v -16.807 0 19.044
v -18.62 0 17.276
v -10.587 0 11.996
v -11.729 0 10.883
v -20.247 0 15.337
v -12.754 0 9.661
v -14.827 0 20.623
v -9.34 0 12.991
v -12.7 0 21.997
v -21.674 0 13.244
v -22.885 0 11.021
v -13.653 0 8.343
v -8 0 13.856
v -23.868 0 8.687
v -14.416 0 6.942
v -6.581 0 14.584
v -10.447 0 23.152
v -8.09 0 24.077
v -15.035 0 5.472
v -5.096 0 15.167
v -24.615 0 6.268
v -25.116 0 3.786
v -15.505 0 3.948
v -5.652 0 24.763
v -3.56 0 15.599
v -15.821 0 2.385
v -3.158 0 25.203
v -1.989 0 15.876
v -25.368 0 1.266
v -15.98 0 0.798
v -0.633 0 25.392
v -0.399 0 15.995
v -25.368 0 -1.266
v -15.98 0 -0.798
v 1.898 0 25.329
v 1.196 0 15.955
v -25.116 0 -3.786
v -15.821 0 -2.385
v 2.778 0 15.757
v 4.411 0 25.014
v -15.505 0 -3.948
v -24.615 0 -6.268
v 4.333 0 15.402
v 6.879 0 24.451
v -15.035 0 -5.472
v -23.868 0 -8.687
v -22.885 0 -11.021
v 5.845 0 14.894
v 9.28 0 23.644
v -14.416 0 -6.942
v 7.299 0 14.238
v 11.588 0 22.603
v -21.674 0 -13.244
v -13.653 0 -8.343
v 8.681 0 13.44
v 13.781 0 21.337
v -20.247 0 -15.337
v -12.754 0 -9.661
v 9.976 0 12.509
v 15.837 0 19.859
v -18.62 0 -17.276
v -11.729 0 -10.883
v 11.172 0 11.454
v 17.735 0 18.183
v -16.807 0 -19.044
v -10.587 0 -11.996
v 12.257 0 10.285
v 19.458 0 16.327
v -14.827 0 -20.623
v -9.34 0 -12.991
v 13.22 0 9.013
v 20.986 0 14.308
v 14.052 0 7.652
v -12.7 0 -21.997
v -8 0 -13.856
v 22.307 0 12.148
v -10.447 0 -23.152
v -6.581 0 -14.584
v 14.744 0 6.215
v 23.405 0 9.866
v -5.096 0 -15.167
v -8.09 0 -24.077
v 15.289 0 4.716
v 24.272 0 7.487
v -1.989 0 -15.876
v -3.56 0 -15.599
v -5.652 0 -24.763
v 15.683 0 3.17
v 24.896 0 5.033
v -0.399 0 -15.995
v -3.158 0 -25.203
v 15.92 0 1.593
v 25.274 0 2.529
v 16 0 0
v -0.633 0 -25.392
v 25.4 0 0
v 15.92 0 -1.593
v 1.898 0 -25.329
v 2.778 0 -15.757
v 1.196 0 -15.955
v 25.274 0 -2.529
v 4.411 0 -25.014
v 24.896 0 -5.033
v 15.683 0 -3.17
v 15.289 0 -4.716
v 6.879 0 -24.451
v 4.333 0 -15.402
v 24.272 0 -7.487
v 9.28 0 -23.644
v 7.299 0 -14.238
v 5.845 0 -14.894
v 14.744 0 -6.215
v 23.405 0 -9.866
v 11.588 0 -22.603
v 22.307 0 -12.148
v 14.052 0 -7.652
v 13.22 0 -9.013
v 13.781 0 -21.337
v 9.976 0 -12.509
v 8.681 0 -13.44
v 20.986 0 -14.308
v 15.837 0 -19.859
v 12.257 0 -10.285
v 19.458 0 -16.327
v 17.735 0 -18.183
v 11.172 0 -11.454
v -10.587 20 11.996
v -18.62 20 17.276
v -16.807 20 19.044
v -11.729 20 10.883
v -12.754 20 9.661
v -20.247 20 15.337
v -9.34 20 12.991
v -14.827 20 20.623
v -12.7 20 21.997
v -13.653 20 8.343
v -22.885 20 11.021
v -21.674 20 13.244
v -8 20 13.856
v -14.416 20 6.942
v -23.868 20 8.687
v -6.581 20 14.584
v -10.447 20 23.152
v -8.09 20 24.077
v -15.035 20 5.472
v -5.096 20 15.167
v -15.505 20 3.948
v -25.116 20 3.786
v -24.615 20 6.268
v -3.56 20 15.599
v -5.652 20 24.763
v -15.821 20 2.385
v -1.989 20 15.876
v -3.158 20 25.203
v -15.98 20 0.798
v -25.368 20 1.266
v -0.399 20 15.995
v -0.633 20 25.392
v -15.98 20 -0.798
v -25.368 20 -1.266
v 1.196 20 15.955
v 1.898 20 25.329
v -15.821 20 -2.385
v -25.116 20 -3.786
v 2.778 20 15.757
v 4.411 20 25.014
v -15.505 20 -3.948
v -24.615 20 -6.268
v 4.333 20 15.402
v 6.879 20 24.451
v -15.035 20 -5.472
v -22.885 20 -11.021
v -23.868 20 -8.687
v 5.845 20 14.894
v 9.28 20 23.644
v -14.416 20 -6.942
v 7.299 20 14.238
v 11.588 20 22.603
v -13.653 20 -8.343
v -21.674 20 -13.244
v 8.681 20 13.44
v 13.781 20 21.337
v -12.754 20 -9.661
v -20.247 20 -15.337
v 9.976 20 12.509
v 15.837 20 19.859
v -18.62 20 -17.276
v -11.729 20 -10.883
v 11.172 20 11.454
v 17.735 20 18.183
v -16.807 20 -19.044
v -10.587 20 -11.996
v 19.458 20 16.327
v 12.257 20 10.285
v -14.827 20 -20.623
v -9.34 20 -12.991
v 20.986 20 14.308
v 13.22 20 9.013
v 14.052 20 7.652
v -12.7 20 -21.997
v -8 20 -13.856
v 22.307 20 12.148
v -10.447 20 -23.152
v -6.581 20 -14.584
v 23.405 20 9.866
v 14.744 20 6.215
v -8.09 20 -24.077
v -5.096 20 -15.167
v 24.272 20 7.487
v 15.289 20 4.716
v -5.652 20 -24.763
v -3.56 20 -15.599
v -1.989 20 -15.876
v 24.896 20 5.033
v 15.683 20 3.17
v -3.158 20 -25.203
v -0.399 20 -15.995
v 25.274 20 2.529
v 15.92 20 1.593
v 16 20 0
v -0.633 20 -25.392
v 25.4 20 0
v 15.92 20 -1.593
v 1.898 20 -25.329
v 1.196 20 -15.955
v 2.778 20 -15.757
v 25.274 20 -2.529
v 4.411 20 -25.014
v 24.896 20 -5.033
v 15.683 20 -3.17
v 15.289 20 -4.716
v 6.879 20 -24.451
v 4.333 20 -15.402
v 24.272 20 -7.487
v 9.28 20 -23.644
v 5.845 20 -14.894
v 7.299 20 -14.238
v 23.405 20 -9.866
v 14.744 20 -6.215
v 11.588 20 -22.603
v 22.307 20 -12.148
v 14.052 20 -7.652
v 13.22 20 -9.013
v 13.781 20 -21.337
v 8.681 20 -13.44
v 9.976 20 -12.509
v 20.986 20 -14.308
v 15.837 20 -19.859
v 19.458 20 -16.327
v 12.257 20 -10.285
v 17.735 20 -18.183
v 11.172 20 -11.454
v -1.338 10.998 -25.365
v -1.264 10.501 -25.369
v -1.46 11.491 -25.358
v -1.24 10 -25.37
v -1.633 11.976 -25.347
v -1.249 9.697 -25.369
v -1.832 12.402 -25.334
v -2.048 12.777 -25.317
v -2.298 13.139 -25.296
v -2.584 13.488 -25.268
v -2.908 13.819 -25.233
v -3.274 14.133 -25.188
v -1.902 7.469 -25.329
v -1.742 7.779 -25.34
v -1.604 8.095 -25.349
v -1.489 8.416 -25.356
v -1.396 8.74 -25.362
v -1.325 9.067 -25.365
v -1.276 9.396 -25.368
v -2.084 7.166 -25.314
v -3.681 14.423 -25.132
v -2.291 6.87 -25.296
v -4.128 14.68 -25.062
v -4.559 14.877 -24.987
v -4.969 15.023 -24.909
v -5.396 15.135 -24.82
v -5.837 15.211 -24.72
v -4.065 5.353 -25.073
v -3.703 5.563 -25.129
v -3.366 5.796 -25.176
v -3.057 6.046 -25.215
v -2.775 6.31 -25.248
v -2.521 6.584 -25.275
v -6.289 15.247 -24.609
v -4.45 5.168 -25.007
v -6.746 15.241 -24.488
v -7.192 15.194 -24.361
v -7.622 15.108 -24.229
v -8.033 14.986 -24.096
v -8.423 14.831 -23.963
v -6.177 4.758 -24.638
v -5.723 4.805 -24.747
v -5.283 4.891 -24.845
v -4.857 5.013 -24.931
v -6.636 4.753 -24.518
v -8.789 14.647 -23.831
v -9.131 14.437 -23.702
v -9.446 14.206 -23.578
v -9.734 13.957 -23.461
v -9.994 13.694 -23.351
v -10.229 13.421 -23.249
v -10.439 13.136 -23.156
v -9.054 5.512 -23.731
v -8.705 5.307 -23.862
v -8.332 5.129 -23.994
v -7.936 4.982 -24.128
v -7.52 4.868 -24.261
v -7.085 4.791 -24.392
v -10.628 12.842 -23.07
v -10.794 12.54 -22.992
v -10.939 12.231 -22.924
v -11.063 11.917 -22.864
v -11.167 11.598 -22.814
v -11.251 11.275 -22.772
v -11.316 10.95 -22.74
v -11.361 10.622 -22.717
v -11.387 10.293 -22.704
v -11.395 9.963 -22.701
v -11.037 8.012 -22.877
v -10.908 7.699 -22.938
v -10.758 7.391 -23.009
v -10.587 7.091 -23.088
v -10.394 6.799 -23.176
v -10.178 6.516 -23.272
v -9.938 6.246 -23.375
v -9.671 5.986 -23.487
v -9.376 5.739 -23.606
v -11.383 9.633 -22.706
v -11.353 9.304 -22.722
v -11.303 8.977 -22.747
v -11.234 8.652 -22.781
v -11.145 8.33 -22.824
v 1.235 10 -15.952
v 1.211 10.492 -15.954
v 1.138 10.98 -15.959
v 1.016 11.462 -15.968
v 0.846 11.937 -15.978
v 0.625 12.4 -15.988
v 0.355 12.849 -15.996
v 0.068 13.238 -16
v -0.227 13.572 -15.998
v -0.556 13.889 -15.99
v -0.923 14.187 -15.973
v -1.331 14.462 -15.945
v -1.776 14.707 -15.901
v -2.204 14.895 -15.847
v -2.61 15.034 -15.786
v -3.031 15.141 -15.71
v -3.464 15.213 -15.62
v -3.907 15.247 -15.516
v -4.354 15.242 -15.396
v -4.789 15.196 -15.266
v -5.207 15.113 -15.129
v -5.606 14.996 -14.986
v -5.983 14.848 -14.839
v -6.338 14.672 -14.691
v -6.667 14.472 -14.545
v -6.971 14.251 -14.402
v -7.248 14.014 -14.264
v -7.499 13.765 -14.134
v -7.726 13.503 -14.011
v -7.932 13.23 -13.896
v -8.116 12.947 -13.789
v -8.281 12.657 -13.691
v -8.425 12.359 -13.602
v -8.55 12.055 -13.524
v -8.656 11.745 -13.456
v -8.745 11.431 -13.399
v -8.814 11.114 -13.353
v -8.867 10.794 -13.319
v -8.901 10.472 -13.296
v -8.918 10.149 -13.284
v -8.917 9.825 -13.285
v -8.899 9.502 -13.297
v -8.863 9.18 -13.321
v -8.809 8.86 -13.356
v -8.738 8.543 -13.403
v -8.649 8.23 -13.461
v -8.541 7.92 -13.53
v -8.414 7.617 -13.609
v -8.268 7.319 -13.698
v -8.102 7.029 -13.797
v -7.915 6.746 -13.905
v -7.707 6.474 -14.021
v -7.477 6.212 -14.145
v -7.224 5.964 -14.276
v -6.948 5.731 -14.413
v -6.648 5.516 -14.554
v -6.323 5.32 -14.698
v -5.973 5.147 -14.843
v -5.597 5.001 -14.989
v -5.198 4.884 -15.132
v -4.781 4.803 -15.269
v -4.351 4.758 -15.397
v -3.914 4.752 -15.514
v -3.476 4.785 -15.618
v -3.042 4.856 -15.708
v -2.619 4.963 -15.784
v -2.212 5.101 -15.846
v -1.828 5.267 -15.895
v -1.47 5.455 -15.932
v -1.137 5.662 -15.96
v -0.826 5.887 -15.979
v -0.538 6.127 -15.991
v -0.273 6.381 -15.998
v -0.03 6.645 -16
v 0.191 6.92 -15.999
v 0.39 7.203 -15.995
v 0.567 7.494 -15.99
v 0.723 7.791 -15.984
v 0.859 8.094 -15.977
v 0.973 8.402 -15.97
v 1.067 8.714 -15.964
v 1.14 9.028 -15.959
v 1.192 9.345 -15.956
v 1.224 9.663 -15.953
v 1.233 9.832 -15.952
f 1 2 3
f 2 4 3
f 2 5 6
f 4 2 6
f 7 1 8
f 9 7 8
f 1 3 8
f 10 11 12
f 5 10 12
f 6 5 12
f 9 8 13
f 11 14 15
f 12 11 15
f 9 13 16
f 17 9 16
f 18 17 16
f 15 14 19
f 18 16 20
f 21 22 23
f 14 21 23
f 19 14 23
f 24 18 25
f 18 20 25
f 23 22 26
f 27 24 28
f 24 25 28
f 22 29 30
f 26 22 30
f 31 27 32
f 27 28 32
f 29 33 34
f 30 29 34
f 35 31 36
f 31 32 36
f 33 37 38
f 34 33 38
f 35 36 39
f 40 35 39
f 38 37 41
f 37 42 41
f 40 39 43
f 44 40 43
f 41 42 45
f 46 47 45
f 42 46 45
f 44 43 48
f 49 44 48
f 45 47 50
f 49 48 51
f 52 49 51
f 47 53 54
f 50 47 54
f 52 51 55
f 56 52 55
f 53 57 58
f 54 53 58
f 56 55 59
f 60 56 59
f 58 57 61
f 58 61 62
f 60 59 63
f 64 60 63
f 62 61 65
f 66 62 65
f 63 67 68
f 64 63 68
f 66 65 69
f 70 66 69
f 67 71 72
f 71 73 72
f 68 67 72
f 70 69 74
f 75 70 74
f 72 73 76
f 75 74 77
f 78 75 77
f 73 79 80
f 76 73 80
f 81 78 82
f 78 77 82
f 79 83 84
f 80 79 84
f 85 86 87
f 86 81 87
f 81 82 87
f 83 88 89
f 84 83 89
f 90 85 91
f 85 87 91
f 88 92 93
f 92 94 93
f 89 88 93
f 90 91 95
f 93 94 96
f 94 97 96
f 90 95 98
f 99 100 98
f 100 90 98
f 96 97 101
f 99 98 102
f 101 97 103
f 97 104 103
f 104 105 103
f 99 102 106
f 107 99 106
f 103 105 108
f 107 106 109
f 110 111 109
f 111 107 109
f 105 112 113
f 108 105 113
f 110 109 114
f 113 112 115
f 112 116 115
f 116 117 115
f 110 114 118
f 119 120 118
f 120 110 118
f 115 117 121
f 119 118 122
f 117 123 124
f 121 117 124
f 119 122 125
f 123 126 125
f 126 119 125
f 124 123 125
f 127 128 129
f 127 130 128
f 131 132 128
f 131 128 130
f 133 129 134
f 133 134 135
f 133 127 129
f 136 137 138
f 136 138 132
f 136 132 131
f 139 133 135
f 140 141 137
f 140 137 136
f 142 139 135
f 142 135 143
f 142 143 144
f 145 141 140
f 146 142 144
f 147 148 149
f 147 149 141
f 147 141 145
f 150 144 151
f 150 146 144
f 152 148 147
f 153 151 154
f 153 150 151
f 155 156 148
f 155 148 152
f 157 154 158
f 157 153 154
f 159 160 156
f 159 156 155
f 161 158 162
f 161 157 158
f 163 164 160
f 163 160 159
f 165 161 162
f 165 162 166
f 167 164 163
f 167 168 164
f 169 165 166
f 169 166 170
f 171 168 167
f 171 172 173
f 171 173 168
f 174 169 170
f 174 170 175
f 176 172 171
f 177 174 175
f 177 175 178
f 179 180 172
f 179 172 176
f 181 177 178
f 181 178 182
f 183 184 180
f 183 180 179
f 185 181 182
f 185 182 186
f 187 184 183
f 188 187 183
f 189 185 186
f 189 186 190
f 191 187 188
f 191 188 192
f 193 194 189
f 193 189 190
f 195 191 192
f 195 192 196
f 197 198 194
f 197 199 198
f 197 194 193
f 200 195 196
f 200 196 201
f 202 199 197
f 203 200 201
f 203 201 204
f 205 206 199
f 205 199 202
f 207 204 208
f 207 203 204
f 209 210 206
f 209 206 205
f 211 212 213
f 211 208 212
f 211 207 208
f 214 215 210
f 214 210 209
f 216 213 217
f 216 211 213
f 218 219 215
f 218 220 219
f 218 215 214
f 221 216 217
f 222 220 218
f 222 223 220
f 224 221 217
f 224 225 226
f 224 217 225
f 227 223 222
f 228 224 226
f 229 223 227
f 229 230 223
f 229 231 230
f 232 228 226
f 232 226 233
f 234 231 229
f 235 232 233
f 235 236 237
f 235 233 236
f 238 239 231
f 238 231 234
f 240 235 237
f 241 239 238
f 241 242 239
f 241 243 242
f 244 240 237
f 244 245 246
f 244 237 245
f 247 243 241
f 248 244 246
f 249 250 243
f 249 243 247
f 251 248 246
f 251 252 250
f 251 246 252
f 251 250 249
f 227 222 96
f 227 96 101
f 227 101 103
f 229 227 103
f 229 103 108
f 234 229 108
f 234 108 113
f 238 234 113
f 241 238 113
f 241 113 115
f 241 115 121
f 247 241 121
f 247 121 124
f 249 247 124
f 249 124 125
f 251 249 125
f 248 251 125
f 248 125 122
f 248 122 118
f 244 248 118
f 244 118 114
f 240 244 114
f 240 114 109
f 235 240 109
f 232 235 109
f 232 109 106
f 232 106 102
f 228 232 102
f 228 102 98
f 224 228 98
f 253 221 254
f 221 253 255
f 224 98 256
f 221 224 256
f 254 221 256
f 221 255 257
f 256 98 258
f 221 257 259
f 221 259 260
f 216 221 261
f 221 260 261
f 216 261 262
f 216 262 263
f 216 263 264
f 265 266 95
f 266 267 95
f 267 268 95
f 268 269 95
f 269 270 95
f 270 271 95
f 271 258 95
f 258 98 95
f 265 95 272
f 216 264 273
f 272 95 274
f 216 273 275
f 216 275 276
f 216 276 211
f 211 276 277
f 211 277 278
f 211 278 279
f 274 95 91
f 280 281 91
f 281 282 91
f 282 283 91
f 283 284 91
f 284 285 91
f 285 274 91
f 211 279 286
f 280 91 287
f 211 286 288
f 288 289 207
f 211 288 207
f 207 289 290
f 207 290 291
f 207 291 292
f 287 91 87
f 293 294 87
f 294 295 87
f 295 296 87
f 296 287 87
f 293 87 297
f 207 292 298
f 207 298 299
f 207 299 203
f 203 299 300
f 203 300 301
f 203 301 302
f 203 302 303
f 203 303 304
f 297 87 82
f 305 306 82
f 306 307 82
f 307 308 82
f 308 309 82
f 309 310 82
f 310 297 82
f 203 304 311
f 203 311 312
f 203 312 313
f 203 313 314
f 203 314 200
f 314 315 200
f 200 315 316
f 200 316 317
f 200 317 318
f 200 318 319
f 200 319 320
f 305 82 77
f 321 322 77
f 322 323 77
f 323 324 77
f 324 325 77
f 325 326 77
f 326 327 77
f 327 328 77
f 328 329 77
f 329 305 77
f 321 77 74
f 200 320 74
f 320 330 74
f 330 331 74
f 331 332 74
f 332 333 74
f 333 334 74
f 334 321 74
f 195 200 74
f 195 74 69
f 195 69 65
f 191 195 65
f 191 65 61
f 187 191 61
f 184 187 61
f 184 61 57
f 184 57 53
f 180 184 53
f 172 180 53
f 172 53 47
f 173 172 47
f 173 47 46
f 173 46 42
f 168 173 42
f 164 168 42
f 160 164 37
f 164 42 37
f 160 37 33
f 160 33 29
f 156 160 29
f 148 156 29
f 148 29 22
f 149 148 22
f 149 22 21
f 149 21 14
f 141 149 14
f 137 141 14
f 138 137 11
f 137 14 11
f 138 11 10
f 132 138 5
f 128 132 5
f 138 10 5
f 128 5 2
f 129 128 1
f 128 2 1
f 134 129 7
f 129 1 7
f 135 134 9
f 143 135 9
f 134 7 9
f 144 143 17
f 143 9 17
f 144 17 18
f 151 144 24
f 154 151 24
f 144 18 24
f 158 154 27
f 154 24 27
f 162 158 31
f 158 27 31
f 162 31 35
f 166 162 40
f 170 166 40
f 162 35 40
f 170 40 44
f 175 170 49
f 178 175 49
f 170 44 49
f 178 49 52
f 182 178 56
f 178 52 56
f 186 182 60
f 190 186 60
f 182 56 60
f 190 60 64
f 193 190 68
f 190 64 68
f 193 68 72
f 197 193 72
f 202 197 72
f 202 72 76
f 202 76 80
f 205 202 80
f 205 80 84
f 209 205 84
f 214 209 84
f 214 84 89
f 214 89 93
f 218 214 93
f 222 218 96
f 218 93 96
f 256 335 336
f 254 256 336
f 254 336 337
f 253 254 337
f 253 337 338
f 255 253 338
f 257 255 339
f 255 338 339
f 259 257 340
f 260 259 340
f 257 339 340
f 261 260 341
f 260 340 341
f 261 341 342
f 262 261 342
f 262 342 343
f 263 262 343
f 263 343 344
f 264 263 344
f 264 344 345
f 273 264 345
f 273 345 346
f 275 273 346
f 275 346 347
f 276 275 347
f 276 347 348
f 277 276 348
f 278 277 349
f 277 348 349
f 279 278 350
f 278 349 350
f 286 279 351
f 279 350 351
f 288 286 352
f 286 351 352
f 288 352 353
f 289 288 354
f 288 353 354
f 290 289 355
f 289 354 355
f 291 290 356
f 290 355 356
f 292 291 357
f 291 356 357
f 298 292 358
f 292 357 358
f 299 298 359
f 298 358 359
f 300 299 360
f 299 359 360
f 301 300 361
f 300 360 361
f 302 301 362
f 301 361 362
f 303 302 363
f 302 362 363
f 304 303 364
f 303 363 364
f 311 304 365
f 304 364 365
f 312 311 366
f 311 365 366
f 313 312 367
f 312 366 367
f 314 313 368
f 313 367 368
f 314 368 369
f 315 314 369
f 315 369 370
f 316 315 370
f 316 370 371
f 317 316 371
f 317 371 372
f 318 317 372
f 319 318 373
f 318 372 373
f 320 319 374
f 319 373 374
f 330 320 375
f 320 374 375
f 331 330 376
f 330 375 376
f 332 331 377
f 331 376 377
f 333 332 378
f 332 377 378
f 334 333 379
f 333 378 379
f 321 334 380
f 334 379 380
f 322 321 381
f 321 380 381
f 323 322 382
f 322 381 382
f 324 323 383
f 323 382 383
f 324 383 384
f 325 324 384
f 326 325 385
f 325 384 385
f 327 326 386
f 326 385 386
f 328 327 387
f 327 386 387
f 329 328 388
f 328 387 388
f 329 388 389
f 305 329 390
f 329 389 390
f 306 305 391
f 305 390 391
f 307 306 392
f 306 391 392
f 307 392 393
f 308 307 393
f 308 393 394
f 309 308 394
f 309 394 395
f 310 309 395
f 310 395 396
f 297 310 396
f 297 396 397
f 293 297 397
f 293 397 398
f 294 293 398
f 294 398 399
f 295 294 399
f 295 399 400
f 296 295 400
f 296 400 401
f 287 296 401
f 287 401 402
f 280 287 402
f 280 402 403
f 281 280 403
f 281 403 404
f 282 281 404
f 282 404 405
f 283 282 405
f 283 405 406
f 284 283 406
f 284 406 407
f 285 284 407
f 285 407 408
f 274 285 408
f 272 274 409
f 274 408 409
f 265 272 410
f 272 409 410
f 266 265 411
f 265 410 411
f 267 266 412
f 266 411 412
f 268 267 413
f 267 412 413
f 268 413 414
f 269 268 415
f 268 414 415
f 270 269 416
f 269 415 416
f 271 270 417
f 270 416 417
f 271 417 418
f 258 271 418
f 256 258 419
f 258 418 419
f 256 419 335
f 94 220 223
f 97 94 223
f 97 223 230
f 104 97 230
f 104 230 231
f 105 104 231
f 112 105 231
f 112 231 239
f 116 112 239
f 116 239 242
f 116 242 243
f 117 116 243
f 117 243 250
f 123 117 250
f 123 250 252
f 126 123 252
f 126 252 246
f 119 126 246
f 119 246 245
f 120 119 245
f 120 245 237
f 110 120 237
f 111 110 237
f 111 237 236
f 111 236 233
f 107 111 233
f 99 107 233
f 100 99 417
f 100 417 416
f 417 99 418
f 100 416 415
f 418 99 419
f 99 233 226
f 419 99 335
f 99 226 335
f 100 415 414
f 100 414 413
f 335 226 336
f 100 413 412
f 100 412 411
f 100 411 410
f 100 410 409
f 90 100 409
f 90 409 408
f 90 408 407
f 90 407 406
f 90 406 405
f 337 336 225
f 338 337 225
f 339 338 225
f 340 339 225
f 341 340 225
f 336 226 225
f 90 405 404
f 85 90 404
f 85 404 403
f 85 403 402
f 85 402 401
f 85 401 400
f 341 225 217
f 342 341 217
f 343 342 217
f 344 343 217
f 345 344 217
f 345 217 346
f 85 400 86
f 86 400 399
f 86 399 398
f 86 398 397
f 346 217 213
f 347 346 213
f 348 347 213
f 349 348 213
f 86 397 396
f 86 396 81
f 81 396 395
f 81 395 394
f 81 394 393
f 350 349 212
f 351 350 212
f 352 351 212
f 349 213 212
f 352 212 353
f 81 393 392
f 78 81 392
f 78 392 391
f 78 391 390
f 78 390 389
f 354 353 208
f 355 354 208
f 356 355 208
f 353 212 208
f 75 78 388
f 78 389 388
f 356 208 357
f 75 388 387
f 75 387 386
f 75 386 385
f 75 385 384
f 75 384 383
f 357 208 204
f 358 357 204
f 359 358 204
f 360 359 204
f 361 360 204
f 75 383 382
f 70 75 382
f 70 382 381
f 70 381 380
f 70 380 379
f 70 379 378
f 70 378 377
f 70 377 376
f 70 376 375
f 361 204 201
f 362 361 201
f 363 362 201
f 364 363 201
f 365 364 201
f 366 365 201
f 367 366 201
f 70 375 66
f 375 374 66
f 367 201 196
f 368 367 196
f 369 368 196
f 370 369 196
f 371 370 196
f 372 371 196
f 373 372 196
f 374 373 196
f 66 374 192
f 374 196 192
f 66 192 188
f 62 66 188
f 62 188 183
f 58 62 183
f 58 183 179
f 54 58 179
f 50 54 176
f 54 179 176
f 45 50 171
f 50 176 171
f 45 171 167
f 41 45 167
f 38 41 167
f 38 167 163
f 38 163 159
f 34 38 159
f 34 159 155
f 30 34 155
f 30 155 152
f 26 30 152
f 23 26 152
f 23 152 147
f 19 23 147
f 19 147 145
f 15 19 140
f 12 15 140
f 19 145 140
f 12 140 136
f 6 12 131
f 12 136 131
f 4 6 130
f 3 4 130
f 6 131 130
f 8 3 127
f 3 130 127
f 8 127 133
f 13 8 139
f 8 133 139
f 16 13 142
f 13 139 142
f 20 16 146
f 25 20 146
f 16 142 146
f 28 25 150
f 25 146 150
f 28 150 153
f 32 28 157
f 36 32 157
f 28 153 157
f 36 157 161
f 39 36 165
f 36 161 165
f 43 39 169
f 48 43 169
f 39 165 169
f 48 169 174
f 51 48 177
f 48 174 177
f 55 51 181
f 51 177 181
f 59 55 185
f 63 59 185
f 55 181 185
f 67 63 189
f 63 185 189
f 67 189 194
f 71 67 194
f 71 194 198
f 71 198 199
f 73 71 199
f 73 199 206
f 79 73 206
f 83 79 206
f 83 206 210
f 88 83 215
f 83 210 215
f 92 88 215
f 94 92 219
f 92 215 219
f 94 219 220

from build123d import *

# Parameters (mm, degrees)
SKETCH1_R                        = 25.4
BOSS_EXTRUDE1_DEPTH              = 20
SKETCH2_R                        = 16
CUT_EXTRUDE1_DEPTH               = 21
F_10_5_10_5_DIAMETER_HOLE1_D     = 10.5
F_10_5_10_5_DIAMETER_HOLE1_DEPTH = 30
F_10_5_10_5_DIAMETER_HOLE1_TIP   = 3.15451825


with BuildPart() as part:
    # Sketch1 → Boss-Extrude1 (new body)
    with BuildSketch(Plane(origin=(0, 0, 0), x_dir=(1, 0, 0), z_dir=(0, 1, 0))):
        Circle(SKETCH1_R)
    extrude(amount=BOSS_EXTRUDE1_DEPTH)

    # Sketch2 → Cut-Extrude1 (cut, through all)
    with BuildSketch(Plane(origin=(0, 20, 0), x_dir=(1, 0, 0), z_dir=(0, 1, 0))):
        Circle(SKETCH2_R)
    extrude(amount=-CUT_EXTRUDE1_DEPTH, mode=Mode.SUBTRACT)

    # Ø10.5 (10.5) Diameter Hole1
    with Locations(Plane(origin=(-6.456859903, 10, -24.565605228), x_dir=(-0.967149812, 0, 0.254207083), z_dir=(-0.254207083, 0, -0.967149812))):
        with Locations((0, 0)):
            Hole(F_10_5_10_5_DIAMETER_HOLE1_D / 2, depth=F_10_5_10_5_DIAMETER_HOLE1_DEPTH)
            with Locations((0, 0, -(F_10_5_10_5_DIAMETER_HOLE1_DEPTH + F_10_5_10_5_DIAMETER_HOLE1_TIP / 2))):  # 118° drill point
                Cone(0, F_10_5_10_5_DIAMETER_HOLE1_D / 2, F_10_5_10_5_DIAMETER_HOLE1_TIP, mode=Mode.SUBTRACT)


solid = part.part
